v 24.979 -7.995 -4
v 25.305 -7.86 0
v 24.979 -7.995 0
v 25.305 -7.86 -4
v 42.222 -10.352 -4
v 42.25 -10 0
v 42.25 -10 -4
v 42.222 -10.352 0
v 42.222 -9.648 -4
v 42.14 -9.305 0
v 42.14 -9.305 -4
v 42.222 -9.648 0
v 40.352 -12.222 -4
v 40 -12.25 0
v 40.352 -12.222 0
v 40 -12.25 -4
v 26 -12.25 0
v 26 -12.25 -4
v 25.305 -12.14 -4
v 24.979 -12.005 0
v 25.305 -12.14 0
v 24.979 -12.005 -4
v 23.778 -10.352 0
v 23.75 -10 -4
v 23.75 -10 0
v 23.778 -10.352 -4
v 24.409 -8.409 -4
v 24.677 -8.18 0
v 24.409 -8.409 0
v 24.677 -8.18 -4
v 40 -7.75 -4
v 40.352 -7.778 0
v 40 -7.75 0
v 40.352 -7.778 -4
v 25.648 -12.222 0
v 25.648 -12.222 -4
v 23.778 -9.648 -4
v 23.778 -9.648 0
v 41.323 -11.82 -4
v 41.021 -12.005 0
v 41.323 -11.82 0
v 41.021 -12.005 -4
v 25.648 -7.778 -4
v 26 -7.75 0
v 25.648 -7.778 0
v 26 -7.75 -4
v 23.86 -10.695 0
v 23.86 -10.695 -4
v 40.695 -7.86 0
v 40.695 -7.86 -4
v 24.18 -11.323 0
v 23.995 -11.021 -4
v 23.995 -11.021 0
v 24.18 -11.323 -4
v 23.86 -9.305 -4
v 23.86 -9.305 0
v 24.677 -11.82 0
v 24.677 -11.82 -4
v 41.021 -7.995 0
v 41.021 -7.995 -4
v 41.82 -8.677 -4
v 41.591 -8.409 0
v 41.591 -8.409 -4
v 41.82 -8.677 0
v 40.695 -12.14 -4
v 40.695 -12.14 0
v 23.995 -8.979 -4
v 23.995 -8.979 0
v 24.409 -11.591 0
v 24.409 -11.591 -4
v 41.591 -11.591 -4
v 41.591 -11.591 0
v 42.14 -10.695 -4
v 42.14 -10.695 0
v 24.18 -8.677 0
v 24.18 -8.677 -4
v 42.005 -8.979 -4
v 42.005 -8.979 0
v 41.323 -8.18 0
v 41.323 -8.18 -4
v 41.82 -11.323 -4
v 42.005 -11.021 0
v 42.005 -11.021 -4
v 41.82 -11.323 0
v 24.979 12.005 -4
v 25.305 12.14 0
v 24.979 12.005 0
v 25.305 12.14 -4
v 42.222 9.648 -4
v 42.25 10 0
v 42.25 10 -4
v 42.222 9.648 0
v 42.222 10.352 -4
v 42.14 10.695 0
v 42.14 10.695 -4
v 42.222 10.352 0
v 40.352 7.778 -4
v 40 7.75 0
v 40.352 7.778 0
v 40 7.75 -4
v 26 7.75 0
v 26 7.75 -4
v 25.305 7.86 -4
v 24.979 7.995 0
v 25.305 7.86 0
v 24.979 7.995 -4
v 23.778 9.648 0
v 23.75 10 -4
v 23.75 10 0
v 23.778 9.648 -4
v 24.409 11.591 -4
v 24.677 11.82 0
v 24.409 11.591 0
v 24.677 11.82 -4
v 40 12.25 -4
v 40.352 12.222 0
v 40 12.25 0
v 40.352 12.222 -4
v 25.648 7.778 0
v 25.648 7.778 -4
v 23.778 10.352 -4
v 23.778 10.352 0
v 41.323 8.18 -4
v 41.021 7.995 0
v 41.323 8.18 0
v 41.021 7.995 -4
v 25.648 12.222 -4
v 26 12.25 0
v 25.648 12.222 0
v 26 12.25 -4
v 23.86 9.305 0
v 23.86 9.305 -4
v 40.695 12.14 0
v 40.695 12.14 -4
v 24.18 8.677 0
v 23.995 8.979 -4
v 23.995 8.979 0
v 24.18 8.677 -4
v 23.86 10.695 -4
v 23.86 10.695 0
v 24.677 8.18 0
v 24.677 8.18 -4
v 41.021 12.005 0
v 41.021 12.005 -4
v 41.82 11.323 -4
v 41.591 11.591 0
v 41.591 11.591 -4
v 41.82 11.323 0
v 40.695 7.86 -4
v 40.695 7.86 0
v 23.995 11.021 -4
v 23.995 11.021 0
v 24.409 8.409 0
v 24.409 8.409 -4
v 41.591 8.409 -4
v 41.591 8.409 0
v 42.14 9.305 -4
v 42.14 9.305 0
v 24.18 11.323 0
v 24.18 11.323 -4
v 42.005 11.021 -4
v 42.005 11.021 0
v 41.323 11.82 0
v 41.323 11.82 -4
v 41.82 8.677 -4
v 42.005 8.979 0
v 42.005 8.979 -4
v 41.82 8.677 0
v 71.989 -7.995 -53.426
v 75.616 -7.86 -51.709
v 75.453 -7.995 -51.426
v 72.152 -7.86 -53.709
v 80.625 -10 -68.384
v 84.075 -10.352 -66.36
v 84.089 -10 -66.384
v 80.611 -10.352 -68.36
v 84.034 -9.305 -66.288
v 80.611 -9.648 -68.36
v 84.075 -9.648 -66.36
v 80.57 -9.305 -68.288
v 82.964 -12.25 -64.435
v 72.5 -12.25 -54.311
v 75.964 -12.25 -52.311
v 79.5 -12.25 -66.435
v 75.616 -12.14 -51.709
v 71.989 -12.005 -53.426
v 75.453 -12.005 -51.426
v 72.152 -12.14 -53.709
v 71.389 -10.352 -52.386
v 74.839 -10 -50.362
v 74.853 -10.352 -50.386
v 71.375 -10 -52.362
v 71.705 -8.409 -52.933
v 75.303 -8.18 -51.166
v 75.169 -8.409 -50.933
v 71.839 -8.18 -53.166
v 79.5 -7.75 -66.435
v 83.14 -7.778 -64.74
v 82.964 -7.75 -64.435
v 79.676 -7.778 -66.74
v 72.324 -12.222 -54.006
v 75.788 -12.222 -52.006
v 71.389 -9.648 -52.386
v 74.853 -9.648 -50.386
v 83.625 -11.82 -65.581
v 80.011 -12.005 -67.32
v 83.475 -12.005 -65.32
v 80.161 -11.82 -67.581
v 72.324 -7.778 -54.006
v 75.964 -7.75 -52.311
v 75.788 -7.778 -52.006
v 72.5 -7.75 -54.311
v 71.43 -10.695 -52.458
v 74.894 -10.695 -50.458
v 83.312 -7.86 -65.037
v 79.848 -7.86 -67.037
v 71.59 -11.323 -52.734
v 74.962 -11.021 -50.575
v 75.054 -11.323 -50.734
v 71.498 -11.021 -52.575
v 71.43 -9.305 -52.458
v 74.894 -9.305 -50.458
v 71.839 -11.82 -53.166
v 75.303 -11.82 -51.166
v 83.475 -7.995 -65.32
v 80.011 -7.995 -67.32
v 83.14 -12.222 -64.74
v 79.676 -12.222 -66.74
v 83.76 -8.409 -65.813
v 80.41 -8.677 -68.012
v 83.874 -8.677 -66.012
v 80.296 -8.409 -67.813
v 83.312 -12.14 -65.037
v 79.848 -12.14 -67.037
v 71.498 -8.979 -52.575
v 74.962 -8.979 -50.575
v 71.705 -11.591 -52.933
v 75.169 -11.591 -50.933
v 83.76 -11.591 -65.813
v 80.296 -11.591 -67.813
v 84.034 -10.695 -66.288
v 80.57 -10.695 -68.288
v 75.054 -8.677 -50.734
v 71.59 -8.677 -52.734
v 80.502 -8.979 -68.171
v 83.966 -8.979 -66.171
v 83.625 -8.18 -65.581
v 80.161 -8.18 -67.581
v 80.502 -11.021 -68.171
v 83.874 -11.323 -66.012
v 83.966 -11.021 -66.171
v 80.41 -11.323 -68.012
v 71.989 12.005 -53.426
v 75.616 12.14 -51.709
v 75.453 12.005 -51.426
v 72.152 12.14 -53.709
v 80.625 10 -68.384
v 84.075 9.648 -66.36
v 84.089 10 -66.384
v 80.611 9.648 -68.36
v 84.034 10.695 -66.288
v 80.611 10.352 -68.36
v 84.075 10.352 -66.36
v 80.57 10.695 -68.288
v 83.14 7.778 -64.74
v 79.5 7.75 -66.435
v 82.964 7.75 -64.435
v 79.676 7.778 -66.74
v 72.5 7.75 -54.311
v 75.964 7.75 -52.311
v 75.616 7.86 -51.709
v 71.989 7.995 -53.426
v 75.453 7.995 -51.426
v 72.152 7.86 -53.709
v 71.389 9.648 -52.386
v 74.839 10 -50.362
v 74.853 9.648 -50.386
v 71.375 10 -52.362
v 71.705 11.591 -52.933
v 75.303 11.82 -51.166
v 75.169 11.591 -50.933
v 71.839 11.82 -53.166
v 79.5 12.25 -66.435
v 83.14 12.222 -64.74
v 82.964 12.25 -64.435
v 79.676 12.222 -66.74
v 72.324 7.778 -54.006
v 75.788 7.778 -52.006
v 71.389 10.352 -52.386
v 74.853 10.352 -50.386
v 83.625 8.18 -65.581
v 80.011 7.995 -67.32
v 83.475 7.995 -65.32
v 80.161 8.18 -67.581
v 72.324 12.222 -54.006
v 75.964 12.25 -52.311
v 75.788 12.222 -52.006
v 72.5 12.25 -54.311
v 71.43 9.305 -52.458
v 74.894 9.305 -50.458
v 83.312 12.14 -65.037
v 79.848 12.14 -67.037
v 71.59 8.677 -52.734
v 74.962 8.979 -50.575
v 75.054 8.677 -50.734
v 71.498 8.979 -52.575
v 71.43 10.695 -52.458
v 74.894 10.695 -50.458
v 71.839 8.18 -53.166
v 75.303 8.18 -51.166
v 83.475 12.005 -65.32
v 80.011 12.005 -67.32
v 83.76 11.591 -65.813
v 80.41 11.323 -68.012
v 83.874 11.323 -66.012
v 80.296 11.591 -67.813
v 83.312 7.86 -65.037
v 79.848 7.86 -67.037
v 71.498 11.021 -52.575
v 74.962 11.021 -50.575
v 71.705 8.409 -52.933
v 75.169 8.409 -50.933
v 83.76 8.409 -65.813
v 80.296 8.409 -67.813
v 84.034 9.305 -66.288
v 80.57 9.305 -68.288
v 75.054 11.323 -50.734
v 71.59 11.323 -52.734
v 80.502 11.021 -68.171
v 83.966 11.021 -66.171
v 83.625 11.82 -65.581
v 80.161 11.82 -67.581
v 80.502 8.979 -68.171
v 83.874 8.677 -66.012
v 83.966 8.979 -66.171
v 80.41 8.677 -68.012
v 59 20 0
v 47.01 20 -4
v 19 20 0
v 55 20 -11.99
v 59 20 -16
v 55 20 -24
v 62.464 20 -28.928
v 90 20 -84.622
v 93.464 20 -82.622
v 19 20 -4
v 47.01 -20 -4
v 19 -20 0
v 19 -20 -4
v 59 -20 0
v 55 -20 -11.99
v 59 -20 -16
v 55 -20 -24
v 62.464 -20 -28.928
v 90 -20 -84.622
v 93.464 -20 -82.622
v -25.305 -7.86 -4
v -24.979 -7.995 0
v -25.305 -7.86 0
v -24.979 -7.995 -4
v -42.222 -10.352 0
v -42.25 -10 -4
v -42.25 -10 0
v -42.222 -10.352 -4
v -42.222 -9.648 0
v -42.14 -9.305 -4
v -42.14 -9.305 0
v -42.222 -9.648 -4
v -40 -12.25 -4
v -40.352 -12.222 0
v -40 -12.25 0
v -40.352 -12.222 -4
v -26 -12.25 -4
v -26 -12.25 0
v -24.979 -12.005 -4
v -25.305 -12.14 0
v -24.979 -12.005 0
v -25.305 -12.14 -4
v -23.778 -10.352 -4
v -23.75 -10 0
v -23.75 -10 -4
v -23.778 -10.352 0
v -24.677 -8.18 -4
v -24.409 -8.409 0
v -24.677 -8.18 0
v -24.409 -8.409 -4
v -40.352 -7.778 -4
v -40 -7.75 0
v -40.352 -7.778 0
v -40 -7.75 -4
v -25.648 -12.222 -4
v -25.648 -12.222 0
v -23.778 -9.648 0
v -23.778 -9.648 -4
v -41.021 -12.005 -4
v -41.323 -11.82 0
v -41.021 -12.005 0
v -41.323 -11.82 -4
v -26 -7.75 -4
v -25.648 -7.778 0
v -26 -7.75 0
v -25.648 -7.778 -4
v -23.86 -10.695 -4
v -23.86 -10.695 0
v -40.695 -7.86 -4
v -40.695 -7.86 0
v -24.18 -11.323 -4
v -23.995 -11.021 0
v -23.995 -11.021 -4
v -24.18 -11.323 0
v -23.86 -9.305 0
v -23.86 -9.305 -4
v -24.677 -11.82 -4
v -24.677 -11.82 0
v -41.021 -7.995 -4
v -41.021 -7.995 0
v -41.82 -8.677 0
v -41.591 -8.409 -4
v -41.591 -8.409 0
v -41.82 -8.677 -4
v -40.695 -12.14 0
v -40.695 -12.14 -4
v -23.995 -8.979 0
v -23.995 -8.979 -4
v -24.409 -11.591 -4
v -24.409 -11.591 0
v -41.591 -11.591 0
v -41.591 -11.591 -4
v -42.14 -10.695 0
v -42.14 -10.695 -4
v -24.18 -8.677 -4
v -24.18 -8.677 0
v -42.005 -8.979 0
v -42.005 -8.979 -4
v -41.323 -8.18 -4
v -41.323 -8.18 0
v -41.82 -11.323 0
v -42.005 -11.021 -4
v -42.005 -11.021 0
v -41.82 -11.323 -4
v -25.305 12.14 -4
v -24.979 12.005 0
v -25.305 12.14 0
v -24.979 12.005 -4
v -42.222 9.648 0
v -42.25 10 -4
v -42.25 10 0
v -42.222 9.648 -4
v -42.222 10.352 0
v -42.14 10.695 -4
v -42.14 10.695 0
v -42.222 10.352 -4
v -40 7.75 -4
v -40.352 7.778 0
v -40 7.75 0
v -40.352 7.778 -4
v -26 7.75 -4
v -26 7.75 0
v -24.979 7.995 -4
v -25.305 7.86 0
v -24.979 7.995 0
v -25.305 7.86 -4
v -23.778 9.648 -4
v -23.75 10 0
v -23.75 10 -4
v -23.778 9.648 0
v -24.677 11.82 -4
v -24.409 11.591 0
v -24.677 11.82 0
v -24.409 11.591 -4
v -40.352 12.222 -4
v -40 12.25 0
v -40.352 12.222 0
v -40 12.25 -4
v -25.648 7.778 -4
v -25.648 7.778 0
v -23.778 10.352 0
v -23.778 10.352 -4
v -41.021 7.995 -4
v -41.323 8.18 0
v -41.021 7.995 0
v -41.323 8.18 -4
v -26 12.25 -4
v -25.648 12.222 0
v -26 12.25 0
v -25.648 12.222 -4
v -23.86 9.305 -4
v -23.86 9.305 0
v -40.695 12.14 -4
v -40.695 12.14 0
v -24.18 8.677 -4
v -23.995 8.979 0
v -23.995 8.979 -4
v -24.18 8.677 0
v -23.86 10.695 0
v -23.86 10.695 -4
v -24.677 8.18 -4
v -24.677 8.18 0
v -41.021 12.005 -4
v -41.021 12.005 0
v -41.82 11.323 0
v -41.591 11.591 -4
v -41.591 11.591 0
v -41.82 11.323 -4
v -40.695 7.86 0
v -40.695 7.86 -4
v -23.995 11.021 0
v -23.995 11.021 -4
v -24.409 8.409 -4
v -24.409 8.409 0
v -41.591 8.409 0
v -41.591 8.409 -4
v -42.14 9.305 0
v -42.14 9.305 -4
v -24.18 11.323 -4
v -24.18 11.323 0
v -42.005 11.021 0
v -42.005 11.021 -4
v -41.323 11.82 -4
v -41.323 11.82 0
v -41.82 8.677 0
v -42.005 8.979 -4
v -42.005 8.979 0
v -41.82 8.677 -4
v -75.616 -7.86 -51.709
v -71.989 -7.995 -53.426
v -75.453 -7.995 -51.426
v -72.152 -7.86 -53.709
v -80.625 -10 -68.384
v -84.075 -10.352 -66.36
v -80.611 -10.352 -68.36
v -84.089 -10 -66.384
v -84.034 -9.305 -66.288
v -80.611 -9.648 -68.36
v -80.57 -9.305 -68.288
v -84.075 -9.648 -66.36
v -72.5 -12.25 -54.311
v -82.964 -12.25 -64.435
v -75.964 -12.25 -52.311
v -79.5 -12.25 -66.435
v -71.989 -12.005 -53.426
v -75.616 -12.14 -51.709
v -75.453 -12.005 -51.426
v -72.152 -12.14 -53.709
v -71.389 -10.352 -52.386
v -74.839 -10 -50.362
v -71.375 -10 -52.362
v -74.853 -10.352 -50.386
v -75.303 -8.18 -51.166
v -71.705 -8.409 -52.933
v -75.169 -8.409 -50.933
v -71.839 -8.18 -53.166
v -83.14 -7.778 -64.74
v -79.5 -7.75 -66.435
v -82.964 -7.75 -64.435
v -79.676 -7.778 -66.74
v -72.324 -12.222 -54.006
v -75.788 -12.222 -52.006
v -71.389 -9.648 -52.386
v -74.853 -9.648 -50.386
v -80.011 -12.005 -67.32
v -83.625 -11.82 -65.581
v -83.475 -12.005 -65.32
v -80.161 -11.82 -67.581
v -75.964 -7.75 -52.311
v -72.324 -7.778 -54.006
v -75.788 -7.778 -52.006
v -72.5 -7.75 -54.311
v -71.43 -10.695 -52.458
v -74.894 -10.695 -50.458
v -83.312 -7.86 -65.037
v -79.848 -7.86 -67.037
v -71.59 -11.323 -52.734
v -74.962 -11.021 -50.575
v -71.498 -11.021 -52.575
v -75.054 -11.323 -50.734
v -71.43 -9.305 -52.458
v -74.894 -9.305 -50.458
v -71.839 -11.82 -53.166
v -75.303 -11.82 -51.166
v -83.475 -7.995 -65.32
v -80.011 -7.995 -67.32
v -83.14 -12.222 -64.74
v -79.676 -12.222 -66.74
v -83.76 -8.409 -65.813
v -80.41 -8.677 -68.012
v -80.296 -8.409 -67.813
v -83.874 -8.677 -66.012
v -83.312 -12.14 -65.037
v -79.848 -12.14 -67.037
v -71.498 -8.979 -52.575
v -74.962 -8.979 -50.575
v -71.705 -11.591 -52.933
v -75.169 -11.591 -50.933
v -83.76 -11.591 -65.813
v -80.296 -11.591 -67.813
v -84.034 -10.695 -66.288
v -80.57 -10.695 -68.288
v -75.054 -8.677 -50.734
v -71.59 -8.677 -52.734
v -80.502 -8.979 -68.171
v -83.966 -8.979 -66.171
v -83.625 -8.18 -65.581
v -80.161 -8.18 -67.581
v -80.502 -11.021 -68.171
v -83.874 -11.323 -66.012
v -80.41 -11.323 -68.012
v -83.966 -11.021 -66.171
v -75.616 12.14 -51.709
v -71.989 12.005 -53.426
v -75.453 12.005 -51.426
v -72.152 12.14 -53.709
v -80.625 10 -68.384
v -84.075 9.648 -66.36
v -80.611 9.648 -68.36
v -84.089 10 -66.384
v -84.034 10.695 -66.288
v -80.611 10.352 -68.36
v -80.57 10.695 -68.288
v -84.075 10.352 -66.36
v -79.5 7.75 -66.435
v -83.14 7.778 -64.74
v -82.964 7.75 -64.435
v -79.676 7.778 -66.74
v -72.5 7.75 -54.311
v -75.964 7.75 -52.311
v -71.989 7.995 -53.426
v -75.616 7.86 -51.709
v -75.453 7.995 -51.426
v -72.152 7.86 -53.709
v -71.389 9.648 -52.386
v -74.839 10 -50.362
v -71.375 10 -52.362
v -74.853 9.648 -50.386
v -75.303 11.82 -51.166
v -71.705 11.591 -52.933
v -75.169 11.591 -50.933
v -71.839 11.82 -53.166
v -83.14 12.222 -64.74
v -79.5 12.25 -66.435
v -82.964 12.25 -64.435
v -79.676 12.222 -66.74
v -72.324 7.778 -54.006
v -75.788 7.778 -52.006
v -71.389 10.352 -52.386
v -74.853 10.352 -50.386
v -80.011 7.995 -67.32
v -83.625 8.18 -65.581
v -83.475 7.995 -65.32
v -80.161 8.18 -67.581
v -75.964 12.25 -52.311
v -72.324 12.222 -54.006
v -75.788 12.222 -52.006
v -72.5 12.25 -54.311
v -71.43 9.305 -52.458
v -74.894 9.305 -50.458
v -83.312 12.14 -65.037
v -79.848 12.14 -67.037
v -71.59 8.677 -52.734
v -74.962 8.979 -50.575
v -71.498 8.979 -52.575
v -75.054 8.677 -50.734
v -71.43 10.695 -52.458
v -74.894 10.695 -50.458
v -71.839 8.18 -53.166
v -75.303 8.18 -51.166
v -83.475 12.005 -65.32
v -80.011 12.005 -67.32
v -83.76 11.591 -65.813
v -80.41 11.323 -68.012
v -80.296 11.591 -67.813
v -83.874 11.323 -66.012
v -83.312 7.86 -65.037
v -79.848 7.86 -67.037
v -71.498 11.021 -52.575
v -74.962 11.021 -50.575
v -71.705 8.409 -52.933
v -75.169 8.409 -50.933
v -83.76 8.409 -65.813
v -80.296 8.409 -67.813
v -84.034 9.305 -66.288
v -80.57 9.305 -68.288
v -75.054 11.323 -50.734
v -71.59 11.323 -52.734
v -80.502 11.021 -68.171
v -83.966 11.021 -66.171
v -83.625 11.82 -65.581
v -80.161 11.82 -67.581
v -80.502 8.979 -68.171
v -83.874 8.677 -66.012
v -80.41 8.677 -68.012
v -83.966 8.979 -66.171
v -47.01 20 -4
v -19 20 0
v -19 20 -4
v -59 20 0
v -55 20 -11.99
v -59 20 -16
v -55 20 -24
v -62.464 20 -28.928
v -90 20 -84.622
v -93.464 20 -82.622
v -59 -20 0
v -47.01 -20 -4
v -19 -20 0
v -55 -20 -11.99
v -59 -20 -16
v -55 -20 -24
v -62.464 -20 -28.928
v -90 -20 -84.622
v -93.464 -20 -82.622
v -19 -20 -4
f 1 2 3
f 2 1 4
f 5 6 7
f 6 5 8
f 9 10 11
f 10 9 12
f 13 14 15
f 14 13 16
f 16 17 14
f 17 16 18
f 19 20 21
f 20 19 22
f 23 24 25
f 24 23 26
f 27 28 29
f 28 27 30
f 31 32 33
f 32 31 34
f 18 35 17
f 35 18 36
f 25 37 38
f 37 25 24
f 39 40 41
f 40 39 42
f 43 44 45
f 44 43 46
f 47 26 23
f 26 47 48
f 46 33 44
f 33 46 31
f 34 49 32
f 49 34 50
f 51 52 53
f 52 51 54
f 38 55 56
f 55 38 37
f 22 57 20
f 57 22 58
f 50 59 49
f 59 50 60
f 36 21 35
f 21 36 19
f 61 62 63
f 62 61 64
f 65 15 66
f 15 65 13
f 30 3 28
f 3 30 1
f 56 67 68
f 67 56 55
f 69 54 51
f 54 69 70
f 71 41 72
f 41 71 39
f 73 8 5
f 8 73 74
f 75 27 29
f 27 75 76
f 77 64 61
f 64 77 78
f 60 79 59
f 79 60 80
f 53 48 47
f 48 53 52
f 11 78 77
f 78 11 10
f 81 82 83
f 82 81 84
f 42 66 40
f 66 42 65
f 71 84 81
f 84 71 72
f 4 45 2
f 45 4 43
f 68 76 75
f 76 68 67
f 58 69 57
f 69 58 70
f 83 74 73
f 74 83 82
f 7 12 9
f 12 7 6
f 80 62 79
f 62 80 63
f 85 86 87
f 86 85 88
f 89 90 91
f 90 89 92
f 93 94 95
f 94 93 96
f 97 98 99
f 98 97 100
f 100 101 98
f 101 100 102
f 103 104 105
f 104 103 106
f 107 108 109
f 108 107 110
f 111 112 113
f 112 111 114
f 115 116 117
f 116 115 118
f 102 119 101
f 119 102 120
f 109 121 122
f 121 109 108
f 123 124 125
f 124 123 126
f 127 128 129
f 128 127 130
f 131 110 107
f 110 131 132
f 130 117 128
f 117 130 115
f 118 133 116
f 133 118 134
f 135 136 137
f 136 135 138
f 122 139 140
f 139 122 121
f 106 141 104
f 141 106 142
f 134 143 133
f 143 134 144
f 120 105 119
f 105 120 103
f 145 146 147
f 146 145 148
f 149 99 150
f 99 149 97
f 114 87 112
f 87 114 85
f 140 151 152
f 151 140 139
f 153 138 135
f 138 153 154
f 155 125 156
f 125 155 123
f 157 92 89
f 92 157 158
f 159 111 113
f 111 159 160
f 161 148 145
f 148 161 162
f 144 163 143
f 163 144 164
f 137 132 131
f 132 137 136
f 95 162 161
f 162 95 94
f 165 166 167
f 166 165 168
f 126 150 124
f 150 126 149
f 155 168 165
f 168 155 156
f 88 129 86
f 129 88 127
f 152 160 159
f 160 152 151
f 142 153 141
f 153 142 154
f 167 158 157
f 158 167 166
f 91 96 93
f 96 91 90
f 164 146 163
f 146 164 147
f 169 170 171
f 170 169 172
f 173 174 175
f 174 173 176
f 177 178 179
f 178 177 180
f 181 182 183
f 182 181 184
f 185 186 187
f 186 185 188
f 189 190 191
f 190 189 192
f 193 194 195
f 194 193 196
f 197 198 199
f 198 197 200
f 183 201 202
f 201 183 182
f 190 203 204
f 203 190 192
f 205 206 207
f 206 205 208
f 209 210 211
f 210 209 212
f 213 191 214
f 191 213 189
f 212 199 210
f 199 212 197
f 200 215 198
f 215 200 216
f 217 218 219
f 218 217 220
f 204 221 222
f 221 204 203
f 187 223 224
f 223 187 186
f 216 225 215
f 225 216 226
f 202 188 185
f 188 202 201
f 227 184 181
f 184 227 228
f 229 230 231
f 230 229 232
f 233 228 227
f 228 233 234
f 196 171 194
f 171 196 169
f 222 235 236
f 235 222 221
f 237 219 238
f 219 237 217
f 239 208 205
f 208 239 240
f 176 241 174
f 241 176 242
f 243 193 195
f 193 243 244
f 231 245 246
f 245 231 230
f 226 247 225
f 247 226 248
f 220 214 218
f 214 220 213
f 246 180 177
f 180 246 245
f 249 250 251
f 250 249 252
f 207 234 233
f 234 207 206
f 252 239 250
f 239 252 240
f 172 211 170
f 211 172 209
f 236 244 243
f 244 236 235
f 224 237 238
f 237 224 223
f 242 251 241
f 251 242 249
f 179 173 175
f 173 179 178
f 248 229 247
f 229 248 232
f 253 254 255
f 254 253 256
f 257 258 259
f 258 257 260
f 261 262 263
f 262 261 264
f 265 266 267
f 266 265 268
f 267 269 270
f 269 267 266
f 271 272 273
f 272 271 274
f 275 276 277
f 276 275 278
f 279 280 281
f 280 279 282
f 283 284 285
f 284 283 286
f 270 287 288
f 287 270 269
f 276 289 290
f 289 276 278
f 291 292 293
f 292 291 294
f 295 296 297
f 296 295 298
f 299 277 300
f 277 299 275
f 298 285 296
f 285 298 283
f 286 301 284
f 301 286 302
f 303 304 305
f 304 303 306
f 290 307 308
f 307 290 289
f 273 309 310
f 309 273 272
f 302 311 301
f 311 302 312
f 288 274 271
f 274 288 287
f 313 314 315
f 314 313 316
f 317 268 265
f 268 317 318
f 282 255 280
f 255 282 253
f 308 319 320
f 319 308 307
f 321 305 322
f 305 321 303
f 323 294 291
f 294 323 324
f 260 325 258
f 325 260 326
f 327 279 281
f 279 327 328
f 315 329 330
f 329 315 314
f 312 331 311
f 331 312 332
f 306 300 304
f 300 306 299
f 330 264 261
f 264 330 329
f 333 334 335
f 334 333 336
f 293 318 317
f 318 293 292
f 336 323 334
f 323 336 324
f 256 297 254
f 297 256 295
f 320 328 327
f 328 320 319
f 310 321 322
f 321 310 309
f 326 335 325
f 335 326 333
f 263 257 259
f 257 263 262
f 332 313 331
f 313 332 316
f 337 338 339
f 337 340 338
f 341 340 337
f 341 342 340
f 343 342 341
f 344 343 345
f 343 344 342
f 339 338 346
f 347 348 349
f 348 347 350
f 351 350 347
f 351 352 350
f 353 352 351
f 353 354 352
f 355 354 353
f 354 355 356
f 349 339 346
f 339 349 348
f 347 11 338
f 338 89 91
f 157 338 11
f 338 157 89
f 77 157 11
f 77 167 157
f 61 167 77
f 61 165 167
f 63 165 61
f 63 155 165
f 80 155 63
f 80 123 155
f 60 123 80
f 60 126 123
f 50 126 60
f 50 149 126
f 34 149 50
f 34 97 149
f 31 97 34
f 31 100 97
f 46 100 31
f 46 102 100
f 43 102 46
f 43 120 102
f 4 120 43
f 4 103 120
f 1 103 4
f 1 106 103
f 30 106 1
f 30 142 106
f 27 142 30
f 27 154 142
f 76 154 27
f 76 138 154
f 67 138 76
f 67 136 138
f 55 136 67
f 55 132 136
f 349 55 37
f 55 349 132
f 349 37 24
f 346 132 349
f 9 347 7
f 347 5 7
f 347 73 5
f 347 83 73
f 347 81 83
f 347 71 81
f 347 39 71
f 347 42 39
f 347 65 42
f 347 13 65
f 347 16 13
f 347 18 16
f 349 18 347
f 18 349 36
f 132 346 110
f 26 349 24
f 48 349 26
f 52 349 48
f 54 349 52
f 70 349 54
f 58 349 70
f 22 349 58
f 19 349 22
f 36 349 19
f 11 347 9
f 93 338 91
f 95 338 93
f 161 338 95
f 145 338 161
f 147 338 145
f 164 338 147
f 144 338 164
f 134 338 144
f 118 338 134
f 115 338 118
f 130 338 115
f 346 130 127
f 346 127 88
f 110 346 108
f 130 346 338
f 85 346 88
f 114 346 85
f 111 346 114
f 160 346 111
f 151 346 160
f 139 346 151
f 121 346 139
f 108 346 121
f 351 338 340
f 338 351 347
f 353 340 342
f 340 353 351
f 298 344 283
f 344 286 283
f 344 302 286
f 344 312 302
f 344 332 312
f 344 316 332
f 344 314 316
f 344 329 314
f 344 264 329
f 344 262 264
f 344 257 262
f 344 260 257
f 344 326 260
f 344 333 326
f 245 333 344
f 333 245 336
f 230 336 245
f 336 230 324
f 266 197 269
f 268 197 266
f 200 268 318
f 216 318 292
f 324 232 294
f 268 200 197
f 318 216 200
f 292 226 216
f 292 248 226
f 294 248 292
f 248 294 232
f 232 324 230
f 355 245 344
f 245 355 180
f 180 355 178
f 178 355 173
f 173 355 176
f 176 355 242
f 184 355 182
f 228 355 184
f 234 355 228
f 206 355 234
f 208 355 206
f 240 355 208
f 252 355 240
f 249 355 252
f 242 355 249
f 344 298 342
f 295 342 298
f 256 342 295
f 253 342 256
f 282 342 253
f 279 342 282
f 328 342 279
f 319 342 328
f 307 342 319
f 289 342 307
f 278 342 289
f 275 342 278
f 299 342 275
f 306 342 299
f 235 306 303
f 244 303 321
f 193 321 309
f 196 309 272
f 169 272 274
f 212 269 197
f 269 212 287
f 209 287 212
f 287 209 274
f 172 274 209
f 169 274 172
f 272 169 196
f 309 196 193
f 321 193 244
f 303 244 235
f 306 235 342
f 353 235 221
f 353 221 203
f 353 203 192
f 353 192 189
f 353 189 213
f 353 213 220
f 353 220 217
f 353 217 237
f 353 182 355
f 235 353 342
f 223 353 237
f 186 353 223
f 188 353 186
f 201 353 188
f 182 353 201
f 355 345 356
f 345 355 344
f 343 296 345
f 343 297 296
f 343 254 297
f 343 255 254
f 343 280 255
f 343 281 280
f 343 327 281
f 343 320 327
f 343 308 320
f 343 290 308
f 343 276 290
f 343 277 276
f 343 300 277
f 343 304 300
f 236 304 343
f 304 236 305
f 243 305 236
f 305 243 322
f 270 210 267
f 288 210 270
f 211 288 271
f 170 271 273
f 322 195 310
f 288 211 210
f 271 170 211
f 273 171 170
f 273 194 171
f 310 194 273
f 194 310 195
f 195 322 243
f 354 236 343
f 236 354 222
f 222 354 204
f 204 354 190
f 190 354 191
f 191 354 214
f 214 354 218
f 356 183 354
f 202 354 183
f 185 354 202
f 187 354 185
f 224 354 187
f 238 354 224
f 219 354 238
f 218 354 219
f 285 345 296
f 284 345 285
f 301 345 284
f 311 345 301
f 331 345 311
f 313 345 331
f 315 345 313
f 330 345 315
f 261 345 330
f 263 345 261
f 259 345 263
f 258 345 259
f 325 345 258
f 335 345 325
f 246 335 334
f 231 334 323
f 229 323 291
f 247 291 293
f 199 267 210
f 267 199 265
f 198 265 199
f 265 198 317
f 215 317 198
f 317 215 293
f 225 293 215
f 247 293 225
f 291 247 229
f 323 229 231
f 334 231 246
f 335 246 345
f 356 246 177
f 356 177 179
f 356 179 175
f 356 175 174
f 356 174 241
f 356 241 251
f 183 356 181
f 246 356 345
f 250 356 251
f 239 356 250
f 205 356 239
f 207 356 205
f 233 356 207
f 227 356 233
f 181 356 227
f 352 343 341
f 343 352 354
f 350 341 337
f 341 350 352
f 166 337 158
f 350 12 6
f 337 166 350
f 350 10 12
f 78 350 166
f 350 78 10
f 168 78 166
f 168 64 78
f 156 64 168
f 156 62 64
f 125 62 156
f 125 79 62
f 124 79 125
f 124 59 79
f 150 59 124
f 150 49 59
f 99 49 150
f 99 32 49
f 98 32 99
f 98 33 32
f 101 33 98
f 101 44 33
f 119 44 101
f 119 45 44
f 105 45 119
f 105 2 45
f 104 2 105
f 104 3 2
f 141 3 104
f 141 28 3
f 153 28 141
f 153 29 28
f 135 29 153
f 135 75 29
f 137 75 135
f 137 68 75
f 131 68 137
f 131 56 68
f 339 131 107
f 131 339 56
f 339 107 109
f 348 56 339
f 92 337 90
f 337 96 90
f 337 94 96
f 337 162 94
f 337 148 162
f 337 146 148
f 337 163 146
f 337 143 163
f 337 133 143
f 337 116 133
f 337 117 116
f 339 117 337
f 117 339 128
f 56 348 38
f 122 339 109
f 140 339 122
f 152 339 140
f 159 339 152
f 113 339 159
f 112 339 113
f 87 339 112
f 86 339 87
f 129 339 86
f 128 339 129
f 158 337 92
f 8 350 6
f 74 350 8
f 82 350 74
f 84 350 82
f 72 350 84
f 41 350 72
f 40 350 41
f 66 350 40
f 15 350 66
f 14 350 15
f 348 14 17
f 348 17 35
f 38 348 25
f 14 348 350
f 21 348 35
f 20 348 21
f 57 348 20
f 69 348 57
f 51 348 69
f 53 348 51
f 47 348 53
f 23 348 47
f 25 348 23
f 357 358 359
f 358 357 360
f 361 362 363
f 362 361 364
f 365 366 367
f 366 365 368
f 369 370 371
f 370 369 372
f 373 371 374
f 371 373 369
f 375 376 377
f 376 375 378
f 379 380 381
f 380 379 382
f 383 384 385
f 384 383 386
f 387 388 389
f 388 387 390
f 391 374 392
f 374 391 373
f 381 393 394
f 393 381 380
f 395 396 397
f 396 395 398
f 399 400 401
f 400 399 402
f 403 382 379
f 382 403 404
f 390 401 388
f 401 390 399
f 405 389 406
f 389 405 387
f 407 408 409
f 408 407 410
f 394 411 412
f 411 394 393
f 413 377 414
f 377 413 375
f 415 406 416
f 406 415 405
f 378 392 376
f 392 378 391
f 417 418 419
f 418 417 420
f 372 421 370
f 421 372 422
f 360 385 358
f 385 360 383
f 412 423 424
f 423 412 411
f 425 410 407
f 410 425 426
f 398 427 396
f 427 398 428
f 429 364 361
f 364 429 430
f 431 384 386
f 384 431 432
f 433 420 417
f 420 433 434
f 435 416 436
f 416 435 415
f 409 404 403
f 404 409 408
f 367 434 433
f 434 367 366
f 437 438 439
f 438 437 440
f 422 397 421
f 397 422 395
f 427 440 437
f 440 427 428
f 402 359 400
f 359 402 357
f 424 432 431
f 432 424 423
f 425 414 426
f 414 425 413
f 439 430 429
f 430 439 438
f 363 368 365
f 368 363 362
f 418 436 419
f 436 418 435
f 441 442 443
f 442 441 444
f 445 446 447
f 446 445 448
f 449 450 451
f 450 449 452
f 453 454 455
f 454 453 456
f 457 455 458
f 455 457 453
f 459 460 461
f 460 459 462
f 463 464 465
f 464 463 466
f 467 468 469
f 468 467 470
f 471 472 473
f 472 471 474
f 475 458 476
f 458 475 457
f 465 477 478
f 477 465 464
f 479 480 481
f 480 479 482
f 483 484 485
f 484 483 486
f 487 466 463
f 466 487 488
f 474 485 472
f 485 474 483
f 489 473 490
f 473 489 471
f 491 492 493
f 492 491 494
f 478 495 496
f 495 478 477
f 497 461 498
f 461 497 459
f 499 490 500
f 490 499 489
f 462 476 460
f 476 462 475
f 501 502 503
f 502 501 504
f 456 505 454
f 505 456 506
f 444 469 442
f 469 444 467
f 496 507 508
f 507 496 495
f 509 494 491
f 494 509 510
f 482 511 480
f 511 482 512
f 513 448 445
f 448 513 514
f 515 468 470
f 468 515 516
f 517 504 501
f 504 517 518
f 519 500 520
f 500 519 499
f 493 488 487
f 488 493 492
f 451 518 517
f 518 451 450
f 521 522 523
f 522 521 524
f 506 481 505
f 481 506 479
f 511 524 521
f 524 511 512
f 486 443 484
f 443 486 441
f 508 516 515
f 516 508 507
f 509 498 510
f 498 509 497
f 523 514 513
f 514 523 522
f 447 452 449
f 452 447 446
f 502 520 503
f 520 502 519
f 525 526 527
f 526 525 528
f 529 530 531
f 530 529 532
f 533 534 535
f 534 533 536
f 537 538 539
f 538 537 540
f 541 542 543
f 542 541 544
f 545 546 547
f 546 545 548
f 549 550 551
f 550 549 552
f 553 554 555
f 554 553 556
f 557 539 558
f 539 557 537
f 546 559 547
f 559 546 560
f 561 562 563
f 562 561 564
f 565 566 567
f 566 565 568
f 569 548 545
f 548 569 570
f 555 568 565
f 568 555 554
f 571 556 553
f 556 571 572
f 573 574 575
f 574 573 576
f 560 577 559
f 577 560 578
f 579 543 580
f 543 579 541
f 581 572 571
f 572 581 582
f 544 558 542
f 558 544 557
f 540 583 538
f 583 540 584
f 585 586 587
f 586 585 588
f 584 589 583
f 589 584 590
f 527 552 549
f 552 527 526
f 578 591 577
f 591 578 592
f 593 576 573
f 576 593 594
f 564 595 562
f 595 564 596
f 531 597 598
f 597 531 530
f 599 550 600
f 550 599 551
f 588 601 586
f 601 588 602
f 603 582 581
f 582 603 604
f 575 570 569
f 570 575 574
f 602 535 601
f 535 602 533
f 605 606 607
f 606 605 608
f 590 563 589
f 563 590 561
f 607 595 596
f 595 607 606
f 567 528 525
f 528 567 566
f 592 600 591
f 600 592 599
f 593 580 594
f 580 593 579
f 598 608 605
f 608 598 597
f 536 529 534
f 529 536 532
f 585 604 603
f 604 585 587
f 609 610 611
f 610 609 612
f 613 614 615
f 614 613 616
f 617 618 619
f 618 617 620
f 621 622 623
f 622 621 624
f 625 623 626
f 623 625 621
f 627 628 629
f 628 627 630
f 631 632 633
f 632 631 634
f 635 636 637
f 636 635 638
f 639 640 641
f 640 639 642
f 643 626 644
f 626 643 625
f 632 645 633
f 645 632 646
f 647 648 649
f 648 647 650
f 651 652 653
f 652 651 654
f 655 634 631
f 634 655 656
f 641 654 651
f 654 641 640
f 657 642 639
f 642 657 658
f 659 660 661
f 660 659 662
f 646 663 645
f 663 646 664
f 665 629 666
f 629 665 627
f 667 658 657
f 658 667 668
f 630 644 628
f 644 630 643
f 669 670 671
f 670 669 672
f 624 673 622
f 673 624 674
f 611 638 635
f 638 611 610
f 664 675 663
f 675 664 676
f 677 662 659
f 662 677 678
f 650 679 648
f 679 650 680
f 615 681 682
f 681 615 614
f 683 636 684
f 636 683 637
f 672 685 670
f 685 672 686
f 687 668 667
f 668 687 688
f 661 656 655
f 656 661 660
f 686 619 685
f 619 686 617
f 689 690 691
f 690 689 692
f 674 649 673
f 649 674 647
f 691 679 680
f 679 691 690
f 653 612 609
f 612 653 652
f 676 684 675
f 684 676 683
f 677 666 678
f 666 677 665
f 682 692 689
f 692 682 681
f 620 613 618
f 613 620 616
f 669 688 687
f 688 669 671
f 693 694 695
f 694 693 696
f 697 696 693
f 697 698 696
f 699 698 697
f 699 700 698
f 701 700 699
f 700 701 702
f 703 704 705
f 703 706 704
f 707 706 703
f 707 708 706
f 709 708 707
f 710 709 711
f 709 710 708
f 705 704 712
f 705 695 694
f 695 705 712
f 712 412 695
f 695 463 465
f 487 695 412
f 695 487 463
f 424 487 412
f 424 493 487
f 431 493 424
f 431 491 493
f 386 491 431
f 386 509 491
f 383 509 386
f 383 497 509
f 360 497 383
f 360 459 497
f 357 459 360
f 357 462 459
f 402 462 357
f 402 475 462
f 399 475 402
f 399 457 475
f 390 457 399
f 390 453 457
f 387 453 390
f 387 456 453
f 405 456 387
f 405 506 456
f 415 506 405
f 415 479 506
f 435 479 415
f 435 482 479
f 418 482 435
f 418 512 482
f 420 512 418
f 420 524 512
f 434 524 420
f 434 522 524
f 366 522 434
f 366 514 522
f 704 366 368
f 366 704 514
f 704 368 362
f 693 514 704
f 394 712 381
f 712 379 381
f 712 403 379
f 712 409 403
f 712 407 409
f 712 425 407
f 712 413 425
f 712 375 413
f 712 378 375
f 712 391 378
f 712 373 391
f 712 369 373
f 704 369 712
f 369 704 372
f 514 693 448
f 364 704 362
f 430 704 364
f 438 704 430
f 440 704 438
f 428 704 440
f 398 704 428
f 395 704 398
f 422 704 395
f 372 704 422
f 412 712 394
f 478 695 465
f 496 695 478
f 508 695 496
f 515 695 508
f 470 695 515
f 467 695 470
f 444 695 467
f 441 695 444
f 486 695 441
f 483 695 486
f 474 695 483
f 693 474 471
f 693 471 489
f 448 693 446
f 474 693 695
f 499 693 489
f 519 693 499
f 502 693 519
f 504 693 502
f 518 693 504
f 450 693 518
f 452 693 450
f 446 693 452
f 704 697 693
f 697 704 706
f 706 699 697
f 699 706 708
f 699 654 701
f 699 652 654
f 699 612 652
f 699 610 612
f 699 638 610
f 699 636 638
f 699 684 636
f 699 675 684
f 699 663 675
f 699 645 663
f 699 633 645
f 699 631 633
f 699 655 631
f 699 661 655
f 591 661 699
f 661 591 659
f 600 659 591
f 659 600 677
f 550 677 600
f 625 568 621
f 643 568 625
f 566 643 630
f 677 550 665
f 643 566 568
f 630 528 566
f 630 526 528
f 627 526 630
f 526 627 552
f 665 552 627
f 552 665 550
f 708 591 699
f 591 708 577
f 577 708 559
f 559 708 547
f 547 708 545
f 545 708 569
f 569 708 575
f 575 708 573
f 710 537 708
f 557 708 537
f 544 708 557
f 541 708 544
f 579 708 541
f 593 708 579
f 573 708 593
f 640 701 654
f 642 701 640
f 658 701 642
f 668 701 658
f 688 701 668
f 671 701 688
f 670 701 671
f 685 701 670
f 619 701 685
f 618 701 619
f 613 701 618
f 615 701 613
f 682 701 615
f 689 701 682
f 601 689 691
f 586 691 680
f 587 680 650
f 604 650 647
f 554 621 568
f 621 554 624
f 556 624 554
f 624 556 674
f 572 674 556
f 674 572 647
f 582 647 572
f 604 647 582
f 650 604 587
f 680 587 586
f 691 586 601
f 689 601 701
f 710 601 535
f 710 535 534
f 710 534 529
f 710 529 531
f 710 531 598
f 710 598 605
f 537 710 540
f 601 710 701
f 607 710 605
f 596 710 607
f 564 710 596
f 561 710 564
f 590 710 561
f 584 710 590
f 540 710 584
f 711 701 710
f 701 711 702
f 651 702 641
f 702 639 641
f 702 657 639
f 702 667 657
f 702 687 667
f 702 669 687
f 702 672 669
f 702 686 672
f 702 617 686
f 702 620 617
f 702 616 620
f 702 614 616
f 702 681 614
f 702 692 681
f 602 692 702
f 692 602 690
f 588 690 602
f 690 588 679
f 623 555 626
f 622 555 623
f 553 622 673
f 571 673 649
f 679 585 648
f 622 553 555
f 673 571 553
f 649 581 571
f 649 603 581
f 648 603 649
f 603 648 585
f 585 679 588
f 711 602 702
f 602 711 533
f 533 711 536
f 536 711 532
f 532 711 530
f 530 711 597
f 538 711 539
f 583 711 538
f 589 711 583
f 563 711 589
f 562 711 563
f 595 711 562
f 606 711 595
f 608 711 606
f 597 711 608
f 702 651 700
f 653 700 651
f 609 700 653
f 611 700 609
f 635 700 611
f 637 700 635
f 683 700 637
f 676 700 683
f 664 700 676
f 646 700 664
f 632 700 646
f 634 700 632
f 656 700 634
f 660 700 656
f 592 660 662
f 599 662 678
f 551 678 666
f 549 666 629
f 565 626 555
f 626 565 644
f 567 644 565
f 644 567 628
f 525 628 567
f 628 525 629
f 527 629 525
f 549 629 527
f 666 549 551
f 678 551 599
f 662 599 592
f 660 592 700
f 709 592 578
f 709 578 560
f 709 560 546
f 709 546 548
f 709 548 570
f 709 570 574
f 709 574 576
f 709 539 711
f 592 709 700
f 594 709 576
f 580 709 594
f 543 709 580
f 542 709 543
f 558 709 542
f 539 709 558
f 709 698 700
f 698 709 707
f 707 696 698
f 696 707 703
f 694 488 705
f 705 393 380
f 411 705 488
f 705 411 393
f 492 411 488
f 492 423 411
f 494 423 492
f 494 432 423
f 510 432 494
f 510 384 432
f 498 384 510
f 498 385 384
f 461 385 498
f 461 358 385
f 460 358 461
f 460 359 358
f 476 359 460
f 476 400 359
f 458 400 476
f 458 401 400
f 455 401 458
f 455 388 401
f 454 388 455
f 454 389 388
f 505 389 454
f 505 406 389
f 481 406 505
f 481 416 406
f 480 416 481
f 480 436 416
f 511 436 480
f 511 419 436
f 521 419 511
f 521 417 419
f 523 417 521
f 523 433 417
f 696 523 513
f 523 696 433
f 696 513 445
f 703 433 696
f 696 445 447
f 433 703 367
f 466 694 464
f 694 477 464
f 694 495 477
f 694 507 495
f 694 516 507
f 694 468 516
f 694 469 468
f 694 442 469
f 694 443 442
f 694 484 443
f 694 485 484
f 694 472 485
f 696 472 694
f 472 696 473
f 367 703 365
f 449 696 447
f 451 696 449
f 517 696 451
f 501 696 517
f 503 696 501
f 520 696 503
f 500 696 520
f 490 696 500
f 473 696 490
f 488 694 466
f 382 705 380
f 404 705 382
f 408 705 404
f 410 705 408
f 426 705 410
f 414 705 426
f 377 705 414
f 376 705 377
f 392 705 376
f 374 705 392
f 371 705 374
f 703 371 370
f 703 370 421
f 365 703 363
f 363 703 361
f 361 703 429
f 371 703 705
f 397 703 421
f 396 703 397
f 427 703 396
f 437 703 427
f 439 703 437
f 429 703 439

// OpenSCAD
// VitisGuard — soporte de la caja estanca sobre la trampa delta.
//
// Reemplaza las planchuelas del prototipo de referencia: se imprimen DOS
// piezas iguales, una a cada lado. Cada una tiene:
//   - ala superior: se atornilla al fondo de la caja (ranuras para ajustar)
//   - montante: define la altura de la cámara sobre la trampa
//   - pata inclinada: se atornilla al lateral de la trampa (ranuras para ajustar)
//
//            caja estanca
//   ═══════════════════════════════
//      ▔▔▔▔▔▔┓            ┏▔▔▔▔▔▔    ← ala superior
//            ┃  montante  ┃
//            ╲            ╱          ← pata (ángulo del lateral de la trampa)
//             ╲  trampa  ╱
//
// MEDIDAS DE PRUEBA: reemplazar por las reales y volver a exportar:
//   openscad -o soporte_caja.stl -D 'parte="imprimir"' soporte_caja.scad
//   openscad -o ensamble.png -D 'parte="ensamble"' soporte_caja.scad
//
// Material: PETG o, mejor, ASA. El PLA se ablanda al sol de Mendoza.

/* [Qué mostrar] */
parte = "ensamble"; // [imprimir, pieza, ensamble]

/* [Trampa delta] */
// Ángulo del lateral de la trampa respecto de la horizontal (°)
angulo_lateral = 60;
// Ancho del techo plano de la trampa, de lateral a lateral (mm)
ancho_techo = 110;
// Largo de la trampa (solo para la vista de ensamble)
largo_trampa = 250;
// Altura de la trampa (solo para la vista de ensamble)
alto_trampa = 120;

/* [Caja estanca] */
caja_ancho = 120;
caja_largo = 120;
caja_alto = 90;

/* [Soporte] */
espesor = 4;
// Ancho de cada pieza, a lo largo de la trampa
ancho = 40;
// Largo del ala que va bajo la caja
largo_ala = 40;
// Separación extra entre caja y techo: sube la cámara
alto_montante = 20;
largo_pata = 70;
// Refuerzo triangular en las esquinas
refuerzo = 8;

/* [Tornillería] */
// 4.5 = paso para M4
diam_tornillo = 4.5;
// Recorrido de las ranuras para ajustar
largo_ranura = 14;

$fn = 40;
e = 0.01;

// Perfil 2D de una pieza (x hacia afuera de la trampa, y hacia arriba).
// El origen es el borde interno del ala; y = 0 es donde apoya la caja.
x_mont = largo_ala - espesor;          // cara interna del montante
y_base = -espesor - alto_montante;     // pie del montante

module perfil() {
    // ala superior
    translate([0, -espesor]) square([largo_ala, espesor]);
    // montante
    translate([x_mont, y_base]) square([espesor, alto_montante + espesor]);
    // pata: su cara inferior apoya sobre el lateral de la trampa
    translate([x_mont, y_base]) rotate(-angulo_lateral) square([largo_pata, espesor]);
    // codo montante-pata engrosado (es donde se concentra el esfuerzo)
    hull() {
        translate([x_mont, y_base]) square([espesor, refuerzo]);
        translate([x_mont, y_base]) rotate(-angulo_lateral) square([refuerzo, espesor]);
    }
    // refuerzo ala-montante
    polygon([[x_mont + e, -espesor + e], [x_mont - refuerzo, -espesor + e],
             [x_mont + e, -espesor - refuerzo]]);
}

module ranura(largo) {
    hull() {
        cylinder(d = diam_tornillo, h = espesor * 3, center = true);
        translate([largo, 0, 0]) cylinder(d = diam_tornillo, h = espesor * 3, center = true);
    }
}

// Pieza en coordenadas de montaje: x afuera, y a lo largo de la trampa, z arriba.
module pieza() {
    difference() {
        rotate([90, 0, 0]) linear_extrude(height = ancho, center = true) perfil();

        // ranuras del ala (tornillos a la caja)
        ala_libre = x_mont - refuerzo;
        for (y = [-ancho / 4, ancho / 4])
            translate([(ala_libre - largo_ranura) / 2, y, -espesor / 2])
                ranura(min(largo_ranura, ala_libre - diam_tornillo * 1.5));

        // ranuras de la pata (tornillos a la trampa), en la mitad inferior
        translate([x_mont, 0, y_base]) rotate([0, angulo_lateral, 0])
            for (y = [-ancho / 4, ancho / 4])
                translate([largo_pata * 0.5, y, espesor / 2]) ranura(largo_ranura);
    }
}

// Para imprimir: el perfil acostado en la cama. Las capas siguen el perfil,
// que es la dirección en que trabaja la pieza: mucho más fuerte que acostada
// sobre el ala, y sin soportes.
module para_imprimir() {
    translate([0, 0, ancho / 2]) rotate([-90, 0, 0]) pieza();
}

module ensamble() {
    // centro de la trampa en x = 0; los laterales pasan por el pie del montante
    dx = ancho_techo / 2 - x_mont;
    for (s = [1, -1]) mirror([s < 0 ? 1 : 0, 0, 0])
        translate([dx, 0, 0]) color("orange") pieza();

    // caja estanca
    %translate([-caja_ancho / 2, -caja_largo / 2, 0]) cube([caja_ancho, caja_largo, caja_alto]);

    // trampa: techo plano y laterales inclinados
    lat = alto_trampa / sin(angulo_lateral);
    %translate([0, 0, y_base]) {
        translate([-ancho_techo / 2, -largo_trampa / 2, -1]) cube([ancho_techo, largo_trampa, 1]);
        for (s = [1, -1]) mirror([s < 0 ? 1 : 0, 0, 0])
            translate([ancho_techo / 2, 0, 0]) rotate([0, angulo_lateral, 0])
                translate([0, -largo_trampa / 2, -1]) cube([lat, largo_trampa, 1]);
    }
}

// Datos útiles al cambiar medidas (aparecen en la consola de OpenSCAD).
hueco_camara = ancho_techo - 2 * largo_ala + 2 * espesor;
echo(str("Hueco libre entre alas para la ventana de la cámara: ", hueco_camara, " mm"));
echo(str("La caja queda ", espesor + alto_montante, " mm por encima del techo de la trampa"));
assert(hueco_camara > 25, "Las alas tapan la cámara: achicar largo_ala o agrandar ancho_techo");
assert(ancho_techo / 2 + espesor <= caja_ancho / 2 + 10, "Los montantes quedan muy afuera de la caja");

if (parte == "imprimir") para_imprimir();
else if (parte == "pieza") pieza();
else ensamble();
